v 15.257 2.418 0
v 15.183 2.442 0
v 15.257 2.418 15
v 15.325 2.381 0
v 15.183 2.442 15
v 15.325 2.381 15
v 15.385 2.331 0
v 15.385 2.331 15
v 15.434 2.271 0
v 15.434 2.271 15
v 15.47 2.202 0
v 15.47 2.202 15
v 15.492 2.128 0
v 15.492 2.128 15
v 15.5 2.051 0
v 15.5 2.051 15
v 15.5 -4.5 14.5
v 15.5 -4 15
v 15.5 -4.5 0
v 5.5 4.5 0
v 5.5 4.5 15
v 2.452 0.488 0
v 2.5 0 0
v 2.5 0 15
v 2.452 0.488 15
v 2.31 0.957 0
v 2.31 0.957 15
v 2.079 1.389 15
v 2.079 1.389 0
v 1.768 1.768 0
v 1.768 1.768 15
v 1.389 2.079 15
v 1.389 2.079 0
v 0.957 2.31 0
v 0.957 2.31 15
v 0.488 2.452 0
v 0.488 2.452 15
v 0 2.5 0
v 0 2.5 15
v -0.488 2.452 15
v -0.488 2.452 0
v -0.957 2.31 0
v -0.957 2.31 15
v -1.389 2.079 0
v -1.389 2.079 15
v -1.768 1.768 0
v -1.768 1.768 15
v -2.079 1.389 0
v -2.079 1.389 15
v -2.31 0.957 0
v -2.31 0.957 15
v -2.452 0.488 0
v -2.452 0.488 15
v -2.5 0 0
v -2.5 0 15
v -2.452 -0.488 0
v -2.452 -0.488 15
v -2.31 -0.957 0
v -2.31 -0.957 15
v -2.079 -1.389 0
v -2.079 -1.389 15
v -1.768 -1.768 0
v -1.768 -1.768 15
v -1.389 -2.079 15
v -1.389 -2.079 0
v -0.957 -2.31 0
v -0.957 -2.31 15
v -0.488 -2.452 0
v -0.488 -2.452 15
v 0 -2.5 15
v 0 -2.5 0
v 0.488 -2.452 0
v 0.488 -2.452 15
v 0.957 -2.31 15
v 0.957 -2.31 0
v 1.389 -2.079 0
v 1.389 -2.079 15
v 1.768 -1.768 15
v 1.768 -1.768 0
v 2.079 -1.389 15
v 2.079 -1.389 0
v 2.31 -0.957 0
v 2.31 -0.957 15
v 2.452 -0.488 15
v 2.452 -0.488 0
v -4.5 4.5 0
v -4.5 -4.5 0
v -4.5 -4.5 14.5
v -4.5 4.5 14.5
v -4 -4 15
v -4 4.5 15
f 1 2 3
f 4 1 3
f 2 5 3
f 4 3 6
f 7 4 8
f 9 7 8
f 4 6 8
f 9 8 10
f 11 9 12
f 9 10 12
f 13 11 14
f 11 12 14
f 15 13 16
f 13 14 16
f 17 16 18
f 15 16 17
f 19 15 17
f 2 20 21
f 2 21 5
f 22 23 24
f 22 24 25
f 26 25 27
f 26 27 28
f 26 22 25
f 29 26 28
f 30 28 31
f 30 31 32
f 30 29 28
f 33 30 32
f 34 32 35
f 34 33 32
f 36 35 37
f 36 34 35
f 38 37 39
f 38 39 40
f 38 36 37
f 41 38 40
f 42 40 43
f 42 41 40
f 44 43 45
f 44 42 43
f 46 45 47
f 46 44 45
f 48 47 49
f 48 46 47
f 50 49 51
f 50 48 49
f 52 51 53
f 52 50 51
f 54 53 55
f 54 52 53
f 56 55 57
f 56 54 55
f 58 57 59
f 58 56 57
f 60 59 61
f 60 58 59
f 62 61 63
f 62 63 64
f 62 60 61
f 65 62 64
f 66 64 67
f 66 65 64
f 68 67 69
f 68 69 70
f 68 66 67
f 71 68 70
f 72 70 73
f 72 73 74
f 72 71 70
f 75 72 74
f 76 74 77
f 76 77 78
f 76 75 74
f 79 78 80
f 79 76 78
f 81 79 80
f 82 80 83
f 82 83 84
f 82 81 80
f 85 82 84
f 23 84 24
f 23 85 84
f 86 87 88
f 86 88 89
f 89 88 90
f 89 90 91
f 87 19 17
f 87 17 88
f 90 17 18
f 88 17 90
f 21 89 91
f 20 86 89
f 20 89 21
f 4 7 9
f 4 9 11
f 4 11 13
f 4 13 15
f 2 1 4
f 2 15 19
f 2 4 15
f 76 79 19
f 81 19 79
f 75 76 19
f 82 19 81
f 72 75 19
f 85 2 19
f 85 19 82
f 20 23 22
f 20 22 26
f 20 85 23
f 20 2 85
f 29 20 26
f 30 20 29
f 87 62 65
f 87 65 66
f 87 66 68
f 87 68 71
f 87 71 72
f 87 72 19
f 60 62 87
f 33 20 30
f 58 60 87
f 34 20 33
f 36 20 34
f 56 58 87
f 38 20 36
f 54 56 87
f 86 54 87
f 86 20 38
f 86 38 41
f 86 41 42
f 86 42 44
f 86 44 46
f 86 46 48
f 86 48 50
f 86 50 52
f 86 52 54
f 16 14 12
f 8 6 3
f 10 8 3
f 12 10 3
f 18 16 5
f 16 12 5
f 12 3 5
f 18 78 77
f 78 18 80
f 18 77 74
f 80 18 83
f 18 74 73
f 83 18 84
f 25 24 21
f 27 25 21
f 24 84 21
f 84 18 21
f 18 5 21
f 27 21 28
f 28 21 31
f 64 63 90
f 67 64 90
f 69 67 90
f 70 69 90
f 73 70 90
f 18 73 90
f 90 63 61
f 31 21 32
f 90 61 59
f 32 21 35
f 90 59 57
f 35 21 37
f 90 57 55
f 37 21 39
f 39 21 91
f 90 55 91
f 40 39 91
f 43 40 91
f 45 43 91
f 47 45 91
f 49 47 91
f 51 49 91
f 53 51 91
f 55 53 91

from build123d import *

# Parameters (mm, degrees)
SKETCH1_R           = 2.5
BOSS_EXTRUDE1_DEPTH = 15
FILLET1_R           = 0.4
CHAMFER2_SIZE       = 0.5


with BuildPart() as part:
    # Sketch1 → Boss-Extrude1 (new body)
    with BuildSketch(Plane.XY):
        Polygon((5.5, 4.5), (15.5, 2.374434383), (15.5, -4.5), (-4.5, -4.5), (-4.5, 4.5), align=None)
        Circle(SKETCH1_R, mode=Mode.SUBTRACT)
    extrude(amount=BOSS_EXTRUDE1_DEPTH)

    # Fillet1
    fillet1_edges = [part.edges().sort_by_distance(p)[0] for p in [
        (15.5, 2.374434383, 7.5),
    ]]
    fillet(fillet1_edges, radius=FILLET1_R)

    # Chamfer2
    chamfer2_edges = [part.edges().sort_by_distance(p)[0] for p in [
        (-4.5, 0, 15),
        (5.5, -4.5, 15),
    ]]
    chamfer(chamfer2_edges, length=CHAMFER2_SIZE)


solid = part.part
